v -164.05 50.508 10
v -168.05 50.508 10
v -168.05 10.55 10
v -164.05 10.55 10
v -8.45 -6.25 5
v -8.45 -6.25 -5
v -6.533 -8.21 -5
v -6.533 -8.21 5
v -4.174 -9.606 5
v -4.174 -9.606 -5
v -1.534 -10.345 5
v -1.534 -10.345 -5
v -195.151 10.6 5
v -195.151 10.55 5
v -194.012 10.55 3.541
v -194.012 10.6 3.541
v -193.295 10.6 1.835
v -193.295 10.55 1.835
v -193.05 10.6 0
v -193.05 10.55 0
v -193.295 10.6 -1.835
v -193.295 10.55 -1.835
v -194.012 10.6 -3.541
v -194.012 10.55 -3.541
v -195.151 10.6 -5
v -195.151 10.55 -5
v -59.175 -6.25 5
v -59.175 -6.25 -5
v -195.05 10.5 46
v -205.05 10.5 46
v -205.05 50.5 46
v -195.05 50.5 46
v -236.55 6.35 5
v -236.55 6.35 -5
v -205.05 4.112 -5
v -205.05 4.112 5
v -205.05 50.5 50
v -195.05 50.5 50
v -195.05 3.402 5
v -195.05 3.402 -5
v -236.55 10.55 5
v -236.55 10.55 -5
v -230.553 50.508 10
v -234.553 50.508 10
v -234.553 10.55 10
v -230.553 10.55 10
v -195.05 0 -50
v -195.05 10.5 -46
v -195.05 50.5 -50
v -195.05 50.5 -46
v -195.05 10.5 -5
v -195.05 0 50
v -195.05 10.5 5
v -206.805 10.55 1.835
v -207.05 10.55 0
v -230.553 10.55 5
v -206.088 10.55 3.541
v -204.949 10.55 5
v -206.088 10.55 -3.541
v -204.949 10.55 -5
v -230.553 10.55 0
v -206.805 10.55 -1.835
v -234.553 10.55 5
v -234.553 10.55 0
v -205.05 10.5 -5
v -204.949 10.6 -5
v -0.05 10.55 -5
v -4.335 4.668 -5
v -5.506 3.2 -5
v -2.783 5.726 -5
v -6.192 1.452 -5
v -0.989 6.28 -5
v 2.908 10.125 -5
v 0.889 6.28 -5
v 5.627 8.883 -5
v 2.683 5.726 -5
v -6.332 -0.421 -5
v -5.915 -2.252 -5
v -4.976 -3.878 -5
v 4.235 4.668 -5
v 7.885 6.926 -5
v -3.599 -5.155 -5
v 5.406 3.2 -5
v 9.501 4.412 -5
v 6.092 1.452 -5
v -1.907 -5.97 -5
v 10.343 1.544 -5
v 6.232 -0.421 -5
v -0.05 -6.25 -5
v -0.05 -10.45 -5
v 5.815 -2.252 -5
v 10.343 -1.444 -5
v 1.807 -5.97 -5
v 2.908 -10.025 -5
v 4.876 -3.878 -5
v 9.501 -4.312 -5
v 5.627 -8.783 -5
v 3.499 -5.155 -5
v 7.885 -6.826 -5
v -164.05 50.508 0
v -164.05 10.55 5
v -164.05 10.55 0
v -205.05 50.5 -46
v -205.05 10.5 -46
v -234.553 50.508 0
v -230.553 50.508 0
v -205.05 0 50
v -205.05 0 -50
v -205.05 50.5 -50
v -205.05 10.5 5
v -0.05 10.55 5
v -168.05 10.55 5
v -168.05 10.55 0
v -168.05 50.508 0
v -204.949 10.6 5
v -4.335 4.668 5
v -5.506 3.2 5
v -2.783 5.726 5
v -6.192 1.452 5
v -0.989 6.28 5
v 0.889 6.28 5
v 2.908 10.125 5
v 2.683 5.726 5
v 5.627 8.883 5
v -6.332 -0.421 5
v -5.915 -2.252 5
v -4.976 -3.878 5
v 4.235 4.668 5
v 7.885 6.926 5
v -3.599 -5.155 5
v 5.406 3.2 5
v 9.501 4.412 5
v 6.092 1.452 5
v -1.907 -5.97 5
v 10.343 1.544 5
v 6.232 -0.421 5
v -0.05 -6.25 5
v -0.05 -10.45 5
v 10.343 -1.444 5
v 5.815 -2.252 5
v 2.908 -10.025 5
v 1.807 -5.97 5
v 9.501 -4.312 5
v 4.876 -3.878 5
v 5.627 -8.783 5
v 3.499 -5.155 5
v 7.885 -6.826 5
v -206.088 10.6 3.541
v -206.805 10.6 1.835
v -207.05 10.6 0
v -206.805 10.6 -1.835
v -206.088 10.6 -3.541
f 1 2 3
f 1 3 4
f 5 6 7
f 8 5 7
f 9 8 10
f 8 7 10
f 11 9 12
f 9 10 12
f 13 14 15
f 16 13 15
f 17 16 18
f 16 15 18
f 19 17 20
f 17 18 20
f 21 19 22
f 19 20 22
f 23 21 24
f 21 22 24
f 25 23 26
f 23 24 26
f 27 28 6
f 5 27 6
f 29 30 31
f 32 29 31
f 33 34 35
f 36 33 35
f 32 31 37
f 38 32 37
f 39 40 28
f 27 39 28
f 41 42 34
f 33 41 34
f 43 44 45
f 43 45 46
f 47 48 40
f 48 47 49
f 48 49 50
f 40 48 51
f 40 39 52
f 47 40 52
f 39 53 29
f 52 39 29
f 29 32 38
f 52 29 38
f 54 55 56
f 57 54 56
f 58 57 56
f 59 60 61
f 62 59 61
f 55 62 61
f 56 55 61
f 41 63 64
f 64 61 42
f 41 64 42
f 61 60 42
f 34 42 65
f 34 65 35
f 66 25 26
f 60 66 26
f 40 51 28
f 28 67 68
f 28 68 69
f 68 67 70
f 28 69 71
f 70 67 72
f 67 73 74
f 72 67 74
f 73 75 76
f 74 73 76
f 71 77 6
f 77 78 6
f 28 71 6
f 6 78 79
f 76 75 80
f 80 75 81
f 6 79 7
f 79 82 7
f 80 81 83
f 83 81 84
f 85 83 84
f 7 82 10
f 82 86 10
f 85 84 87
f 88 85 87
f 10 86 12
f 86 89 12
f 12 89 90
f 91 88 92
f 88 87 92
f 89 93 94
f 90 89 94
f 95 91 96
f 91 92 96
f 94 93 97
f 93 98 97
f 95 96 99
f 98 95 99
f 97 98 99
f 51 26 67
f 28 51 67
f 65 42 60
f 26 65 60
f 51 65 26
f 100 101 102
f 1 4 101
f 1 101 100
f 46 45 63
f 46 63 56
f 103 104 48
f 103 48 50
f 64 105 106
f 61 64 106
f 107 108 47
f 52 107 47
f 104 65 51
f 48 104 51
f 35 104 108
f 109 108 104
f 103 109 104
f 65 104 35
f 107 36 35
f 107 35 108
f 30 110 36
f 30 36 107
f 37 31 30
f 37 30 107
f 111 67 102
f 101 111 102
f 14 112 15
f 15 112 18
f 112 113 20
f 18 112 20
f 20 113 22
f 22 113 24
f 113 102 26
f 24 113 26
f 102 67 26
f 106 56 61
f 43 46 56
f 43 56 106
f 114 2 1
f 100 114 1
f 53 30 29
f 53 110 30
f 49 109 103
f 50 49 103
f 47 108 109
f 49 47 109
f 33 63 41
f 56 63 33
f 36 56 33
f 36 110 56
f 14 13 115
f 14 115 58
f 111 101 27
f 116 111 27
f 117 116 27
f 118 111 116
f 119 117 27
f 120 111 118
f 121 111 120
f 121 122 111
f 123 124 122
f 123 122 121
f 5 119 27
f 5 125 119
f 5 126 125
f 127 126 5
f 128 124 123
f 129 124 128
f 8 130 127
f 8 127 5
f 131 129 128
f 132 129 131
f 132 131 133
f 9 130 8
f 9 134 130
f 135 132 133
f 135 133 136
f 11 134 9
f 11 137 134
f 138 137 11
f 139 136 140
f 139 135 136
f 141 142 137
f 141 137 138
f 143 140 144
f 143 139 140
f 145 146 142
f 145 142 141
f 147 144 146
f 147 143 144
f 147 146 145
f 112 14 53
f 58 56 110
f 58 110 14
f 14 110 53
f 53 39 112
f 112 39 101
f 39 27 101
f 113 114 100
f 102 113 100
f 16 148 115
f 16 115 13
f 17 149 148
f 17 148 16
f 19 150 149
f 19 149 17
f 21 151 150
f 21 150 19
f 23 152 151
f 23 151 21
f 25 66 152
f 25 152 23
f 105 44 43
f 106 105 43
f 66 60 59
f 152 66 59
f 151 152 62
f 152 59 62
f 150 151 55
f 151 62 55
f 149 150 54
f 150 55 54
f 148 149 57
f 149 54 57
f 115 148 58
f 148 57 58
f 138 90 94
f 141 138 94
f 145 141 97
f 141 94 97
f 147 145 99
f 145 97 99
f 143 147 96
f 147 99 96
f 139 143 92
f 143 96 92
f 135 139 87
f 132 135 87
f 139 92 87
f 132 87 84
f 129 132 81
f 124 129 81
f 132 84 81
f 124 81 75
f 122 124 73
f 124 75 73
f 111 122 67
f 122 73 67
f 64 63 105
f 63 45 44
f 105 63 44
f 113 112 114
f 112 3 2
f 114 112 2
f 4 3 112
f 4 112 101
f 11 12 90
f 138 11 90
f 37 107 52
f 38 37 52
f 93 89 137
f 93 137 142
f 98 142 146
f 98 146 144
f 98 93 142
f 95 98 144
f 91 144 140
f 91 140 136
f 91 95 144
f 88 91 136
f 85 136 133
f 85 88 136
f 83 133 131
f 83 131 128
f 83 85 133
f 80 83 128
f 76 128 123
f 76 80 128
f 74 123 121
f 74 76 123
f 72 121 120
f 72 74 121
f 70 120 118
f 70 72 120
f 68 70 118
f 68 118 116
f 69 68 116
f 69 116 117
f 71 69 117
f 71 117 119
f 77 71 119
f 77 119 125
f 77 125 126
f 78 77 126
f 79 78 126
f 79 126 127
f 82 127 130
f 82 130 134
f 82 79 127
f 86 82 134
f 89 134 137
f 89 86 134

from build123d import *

# Parameters (mm, degrees)
SKETCH1_R             = 6.3
BOSS_EXTRUDE2_DEPTH   = 10
BODY_MOVE_COPY1_ANGLE = 90
BOSS_EXTRUDE4_DEPTH   = 10.5
BOSS_EXTRUDE5_DEPTH   = 0.05
SKETCH5_W             = 4
SKETCH5_H             = 39.958
BOSS_EXTRUDE6_DEPTH   = 10
SKETCH6_W             = 4
SKETCH6_H             = 40
BOSS_EXTRUDE7_DEPTH   = 10


with BuildPart() as part:
    # Sketch1 → Boss-Extrude2 (new body)
    with BuildSketch(Plane.XY):
        with BuildLine():
            Line((10.394563839, -1.484265), (10.5, 0))
            ThreePointArc((10.5, 0), (0, 10.5), (-10.5, 0))
            Line((-10.5, 0), (-10.5, -236.5))
            Line((-10.5, -236.5), (-6.3, -236.5))
            Line((-6.3, -236.5), (6.3, -59.125))
            Line((6.3, -59.125), (6.3, -8.4))
            ThreePointArc((6.3, -8.4), (9.035151526, -5.349395938), (10.394563839, -1.484265))
        make_face()
        Circle(SKETCH1_R, mode=Mode.SUBTRACT)
    extrude(amount=BOSS_EXTRUDE2_DEPTH)


with BuildPart() as part_1:
    # Body-Move/Copy1: moved
    add(part.part.rotate(Axis((-34.8, -34.75, 0), (0, 0, -1)), BODY_MOVE_COPY1_ANGLE))


with BuildPart() as part_2:
    # Body-Move/Copy2: moved
    add(part_1.part.moved(Location((0, 69.6, 0))))

    # Sketch3 → Boss-Extrude4 (add)
    with BuildSketch(Plane(origin=(0, 0, 0), x_dir=(1, 0, 0), z_dir=(0, 1, 0))):
        Polygon((-195.05, -55), (-195.05, -5), (-195.05, 45), (-205.05, 45), (-205.05, -45), (-205.05, -55), align=None)
    extrude(amount=BOSS_EXTRUDE4_DEPTH)

    # Sketch4 → Boss-Extrude5 (add)
    with BuildSketch(Plane(origin=(0, 10.55, 0), x_dir=(1, 0, 0), z_dir=(0, 1, 0))):
        with BuildLine():
            ThreePointArc((-195.151020514, -10), (-193.596595612, -7.711747002), (-193.05, -5))
            ThreePointArc((-193.05, -5), (-193.596595612, -2.288252998), (-195.151020514, 0))
            Line((-195.151020514, 0), (-204.948979486, 0))
            ThreePointArc((-204.948979486, 0), (-207.05, -5), (-204.948979486, -10))
            Line((-204.948979486, -10), (-195.151020514, -10))
        make_face()
    extrude(amount=BOSS_EXTRUDE5_DEPTH)


with BuildPart() as part_3:
    # Body-Move/Copy4: moved
    add(part_2.part.moved(Location((0, 0, -5))))

    # Sketch5 → Boss-Extrude6 (add)
    with BuildSketch(Plane.XY.offset(10)):
        with Locations((-166.05, 30.529)):
            Rectangle(SKETCH5_W, SKETCH5_H)
        with Locations((-232.552850517, 30.529)):
            Rectangle(SKETCH5_W, SKETCH5_H)
    extrude(amount=-BOSS_EXTRUDE6_DEPTH)

    # Sketch6 → Boss-Extrude7 (add)
    with BuildSketch(Plane.ZY.offset(205.05)):
        with Locations((-48, 30.5)):
            Rectangle(SKETCH6_W, SKETCH6_H)
        with Locations((48, 30.5)):
            Rectangle(SKETCH6_W, SKETCH6_H)
    extrude(amount=-BOSS_EXTRUDE7_DEPTH)


solid = part_3.part
